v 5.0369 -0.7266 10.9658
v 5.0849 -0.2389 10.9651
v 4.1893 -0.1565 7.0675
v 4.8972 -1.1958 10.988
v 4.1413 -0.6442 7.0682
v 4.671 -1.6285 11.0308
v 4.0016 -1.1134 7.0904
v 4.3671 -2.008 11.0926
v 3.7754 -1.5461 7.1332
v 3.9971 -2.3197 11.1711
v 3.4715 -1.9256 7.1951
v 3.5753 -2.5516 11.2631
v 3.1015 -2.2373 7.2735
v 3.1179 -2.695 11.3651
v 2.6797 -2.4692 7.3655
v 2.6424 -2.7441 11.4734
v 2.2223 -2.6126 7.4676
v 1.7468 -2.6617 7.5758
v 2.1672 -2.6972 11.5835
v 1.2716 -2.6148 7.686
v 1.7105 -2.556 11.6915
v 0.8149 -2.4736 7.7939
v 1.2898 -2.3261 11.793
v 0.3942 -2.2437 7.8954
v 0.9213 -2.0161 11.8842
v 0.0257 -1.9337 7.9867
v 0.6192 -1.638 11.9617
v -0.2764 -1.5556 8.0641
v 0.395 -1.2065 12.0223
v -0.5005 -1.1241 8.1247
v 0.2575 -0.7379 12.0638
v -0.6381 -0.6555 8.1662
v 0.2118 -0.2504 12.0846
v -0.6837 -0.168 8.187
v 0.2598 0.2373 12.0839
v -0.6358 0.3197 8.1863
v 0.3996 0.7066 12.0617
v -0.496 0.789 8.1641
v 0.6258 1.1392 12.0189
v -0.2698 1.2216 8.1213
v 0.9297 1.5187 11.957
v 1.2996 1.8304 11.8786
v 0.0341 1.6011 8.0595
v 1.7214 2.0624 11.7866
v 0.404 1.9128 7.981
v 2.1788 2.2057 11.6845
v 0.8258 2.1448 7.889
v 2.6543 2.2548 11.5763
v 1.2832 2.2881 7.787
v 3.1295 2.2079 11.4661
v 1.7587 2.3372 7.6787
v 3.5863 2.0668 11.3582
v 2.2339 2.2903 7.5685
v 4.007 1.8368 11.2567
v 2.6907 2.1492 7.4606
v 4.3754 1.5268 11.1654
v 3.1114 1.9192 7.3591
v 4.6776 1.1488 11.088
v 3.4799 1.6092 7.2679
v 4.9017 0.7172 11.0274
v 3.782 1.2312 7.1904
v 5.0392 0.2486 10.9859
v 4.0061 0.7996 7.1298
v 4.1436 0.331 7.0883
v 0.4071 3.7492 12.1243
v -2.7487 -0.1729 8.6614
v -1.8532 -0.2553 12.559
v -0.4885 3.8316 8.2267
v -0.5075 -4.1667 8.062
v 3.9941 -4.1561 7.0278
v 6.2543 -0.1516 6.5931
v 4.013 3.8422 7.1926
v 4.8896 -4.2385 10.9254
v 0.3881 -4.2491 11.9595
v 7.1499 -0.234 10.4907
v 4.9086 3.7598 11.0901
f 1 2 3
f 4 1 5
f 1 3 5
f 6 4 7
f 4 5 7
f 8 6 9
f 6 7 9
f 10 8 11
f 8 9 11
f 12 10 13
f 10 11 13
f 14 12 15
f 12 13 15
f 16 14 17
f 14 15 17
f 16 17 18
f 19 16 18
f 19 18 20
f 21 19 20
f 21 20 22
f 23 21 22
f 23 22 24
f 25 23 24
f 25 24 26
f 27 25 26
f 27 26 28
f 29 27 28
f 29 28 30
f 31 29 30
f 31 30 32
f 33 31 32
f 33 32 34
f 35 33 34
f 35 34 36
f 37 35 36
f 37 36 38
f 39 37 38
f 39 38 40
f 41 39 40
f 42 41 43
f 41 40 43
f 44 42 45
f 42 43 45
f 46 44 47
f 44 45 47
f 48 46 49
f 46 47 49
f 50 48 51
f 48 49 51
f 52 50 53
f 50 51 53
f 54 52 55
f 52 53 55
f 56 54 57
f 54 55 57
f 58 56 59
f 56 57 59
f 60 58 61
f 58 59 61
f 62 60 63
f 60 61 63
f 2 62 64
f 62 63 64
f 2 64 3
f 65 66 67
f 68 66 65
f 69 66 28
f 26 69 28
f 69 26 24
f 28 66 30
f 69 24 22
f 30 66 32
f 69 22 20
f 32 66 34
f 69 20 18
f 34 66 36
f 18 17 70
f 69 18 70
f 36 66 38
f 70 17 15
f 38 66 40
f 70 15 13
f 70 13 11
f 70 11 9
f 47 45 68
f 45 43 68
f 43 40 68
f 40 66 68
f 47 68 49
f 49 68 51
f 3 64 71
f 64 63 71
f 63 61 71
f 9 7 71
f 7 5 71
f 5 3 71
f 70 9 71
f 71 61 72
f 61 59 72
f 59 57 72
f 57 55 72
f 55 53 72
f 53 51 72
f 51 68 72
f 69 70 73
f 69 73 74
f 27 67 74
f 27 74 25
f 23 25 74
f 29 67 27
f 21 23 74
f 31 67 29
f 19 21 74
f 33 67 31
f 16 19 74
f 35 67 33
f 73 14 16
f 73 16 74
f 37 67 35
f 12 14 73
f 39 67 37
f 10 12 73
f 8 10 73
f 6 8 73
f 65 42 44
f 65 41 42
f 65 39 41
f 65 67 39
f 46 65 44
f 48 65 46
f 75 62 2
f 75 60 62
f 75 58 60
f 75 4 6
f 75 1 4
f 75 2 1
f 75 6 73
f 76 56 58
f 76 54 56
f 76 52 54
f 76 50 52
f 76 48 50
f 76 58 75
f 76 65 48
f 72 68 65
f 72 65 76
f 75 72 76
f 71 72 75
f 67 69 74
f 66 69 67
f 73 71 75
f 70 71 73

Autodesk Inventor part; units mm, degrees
ref_plane "YZ Plane" through (0, 0, 0) normal (1, 0, 0) x (0, 1, 0)
ref_plane "XZ Plane" through (0, 0, 0) normal (0, 1, 0) x (-1, 0, 0)
ref_plane "XY Plane" through (0, 0, 0) normal (0, 0, 1) x (1, 0, 0)
ref_plane "Work Plane2" through (-37.9568, -6.3739, 16.6205) normal (0.2239, -0.0206, 0.9744) x (0.9746, 0.0023, -0.2239)
sketch "Sketch1" plane through (-37.9568, -6.3739, 16.6205) normal (0.2239, -0.0206, 0.9744) x (0.9746, 0.0023, -0.2239)
  circle A0 centre (40.7292, 6.1193) radius 2.5
  line L0 (45.348, 6.1193) -> (43.0386, 2.1193)
  line L1 (43.0386, 2.1193) -> (38.4198, 2.1193)
  line L2 (38.4198, 2.1193) -> (36.1104, 6.1193)
  line L3 (36.1104, 6.1193) -> (38.4198, 10.1193)
  line L4 (38.4198, 10.1193) -> (43.0386, 10.1193)
  line L5 (43.0386, 10.1193) -> (45.348, 6.1193)
  point P0 (40.7292, 6.1193)
  dimension "d0" = 5
  dimension "d1" = 8
extrude "Extrusion1" add sketch "Sketch1" along normal blind 4
properties part number "m5_nut"
